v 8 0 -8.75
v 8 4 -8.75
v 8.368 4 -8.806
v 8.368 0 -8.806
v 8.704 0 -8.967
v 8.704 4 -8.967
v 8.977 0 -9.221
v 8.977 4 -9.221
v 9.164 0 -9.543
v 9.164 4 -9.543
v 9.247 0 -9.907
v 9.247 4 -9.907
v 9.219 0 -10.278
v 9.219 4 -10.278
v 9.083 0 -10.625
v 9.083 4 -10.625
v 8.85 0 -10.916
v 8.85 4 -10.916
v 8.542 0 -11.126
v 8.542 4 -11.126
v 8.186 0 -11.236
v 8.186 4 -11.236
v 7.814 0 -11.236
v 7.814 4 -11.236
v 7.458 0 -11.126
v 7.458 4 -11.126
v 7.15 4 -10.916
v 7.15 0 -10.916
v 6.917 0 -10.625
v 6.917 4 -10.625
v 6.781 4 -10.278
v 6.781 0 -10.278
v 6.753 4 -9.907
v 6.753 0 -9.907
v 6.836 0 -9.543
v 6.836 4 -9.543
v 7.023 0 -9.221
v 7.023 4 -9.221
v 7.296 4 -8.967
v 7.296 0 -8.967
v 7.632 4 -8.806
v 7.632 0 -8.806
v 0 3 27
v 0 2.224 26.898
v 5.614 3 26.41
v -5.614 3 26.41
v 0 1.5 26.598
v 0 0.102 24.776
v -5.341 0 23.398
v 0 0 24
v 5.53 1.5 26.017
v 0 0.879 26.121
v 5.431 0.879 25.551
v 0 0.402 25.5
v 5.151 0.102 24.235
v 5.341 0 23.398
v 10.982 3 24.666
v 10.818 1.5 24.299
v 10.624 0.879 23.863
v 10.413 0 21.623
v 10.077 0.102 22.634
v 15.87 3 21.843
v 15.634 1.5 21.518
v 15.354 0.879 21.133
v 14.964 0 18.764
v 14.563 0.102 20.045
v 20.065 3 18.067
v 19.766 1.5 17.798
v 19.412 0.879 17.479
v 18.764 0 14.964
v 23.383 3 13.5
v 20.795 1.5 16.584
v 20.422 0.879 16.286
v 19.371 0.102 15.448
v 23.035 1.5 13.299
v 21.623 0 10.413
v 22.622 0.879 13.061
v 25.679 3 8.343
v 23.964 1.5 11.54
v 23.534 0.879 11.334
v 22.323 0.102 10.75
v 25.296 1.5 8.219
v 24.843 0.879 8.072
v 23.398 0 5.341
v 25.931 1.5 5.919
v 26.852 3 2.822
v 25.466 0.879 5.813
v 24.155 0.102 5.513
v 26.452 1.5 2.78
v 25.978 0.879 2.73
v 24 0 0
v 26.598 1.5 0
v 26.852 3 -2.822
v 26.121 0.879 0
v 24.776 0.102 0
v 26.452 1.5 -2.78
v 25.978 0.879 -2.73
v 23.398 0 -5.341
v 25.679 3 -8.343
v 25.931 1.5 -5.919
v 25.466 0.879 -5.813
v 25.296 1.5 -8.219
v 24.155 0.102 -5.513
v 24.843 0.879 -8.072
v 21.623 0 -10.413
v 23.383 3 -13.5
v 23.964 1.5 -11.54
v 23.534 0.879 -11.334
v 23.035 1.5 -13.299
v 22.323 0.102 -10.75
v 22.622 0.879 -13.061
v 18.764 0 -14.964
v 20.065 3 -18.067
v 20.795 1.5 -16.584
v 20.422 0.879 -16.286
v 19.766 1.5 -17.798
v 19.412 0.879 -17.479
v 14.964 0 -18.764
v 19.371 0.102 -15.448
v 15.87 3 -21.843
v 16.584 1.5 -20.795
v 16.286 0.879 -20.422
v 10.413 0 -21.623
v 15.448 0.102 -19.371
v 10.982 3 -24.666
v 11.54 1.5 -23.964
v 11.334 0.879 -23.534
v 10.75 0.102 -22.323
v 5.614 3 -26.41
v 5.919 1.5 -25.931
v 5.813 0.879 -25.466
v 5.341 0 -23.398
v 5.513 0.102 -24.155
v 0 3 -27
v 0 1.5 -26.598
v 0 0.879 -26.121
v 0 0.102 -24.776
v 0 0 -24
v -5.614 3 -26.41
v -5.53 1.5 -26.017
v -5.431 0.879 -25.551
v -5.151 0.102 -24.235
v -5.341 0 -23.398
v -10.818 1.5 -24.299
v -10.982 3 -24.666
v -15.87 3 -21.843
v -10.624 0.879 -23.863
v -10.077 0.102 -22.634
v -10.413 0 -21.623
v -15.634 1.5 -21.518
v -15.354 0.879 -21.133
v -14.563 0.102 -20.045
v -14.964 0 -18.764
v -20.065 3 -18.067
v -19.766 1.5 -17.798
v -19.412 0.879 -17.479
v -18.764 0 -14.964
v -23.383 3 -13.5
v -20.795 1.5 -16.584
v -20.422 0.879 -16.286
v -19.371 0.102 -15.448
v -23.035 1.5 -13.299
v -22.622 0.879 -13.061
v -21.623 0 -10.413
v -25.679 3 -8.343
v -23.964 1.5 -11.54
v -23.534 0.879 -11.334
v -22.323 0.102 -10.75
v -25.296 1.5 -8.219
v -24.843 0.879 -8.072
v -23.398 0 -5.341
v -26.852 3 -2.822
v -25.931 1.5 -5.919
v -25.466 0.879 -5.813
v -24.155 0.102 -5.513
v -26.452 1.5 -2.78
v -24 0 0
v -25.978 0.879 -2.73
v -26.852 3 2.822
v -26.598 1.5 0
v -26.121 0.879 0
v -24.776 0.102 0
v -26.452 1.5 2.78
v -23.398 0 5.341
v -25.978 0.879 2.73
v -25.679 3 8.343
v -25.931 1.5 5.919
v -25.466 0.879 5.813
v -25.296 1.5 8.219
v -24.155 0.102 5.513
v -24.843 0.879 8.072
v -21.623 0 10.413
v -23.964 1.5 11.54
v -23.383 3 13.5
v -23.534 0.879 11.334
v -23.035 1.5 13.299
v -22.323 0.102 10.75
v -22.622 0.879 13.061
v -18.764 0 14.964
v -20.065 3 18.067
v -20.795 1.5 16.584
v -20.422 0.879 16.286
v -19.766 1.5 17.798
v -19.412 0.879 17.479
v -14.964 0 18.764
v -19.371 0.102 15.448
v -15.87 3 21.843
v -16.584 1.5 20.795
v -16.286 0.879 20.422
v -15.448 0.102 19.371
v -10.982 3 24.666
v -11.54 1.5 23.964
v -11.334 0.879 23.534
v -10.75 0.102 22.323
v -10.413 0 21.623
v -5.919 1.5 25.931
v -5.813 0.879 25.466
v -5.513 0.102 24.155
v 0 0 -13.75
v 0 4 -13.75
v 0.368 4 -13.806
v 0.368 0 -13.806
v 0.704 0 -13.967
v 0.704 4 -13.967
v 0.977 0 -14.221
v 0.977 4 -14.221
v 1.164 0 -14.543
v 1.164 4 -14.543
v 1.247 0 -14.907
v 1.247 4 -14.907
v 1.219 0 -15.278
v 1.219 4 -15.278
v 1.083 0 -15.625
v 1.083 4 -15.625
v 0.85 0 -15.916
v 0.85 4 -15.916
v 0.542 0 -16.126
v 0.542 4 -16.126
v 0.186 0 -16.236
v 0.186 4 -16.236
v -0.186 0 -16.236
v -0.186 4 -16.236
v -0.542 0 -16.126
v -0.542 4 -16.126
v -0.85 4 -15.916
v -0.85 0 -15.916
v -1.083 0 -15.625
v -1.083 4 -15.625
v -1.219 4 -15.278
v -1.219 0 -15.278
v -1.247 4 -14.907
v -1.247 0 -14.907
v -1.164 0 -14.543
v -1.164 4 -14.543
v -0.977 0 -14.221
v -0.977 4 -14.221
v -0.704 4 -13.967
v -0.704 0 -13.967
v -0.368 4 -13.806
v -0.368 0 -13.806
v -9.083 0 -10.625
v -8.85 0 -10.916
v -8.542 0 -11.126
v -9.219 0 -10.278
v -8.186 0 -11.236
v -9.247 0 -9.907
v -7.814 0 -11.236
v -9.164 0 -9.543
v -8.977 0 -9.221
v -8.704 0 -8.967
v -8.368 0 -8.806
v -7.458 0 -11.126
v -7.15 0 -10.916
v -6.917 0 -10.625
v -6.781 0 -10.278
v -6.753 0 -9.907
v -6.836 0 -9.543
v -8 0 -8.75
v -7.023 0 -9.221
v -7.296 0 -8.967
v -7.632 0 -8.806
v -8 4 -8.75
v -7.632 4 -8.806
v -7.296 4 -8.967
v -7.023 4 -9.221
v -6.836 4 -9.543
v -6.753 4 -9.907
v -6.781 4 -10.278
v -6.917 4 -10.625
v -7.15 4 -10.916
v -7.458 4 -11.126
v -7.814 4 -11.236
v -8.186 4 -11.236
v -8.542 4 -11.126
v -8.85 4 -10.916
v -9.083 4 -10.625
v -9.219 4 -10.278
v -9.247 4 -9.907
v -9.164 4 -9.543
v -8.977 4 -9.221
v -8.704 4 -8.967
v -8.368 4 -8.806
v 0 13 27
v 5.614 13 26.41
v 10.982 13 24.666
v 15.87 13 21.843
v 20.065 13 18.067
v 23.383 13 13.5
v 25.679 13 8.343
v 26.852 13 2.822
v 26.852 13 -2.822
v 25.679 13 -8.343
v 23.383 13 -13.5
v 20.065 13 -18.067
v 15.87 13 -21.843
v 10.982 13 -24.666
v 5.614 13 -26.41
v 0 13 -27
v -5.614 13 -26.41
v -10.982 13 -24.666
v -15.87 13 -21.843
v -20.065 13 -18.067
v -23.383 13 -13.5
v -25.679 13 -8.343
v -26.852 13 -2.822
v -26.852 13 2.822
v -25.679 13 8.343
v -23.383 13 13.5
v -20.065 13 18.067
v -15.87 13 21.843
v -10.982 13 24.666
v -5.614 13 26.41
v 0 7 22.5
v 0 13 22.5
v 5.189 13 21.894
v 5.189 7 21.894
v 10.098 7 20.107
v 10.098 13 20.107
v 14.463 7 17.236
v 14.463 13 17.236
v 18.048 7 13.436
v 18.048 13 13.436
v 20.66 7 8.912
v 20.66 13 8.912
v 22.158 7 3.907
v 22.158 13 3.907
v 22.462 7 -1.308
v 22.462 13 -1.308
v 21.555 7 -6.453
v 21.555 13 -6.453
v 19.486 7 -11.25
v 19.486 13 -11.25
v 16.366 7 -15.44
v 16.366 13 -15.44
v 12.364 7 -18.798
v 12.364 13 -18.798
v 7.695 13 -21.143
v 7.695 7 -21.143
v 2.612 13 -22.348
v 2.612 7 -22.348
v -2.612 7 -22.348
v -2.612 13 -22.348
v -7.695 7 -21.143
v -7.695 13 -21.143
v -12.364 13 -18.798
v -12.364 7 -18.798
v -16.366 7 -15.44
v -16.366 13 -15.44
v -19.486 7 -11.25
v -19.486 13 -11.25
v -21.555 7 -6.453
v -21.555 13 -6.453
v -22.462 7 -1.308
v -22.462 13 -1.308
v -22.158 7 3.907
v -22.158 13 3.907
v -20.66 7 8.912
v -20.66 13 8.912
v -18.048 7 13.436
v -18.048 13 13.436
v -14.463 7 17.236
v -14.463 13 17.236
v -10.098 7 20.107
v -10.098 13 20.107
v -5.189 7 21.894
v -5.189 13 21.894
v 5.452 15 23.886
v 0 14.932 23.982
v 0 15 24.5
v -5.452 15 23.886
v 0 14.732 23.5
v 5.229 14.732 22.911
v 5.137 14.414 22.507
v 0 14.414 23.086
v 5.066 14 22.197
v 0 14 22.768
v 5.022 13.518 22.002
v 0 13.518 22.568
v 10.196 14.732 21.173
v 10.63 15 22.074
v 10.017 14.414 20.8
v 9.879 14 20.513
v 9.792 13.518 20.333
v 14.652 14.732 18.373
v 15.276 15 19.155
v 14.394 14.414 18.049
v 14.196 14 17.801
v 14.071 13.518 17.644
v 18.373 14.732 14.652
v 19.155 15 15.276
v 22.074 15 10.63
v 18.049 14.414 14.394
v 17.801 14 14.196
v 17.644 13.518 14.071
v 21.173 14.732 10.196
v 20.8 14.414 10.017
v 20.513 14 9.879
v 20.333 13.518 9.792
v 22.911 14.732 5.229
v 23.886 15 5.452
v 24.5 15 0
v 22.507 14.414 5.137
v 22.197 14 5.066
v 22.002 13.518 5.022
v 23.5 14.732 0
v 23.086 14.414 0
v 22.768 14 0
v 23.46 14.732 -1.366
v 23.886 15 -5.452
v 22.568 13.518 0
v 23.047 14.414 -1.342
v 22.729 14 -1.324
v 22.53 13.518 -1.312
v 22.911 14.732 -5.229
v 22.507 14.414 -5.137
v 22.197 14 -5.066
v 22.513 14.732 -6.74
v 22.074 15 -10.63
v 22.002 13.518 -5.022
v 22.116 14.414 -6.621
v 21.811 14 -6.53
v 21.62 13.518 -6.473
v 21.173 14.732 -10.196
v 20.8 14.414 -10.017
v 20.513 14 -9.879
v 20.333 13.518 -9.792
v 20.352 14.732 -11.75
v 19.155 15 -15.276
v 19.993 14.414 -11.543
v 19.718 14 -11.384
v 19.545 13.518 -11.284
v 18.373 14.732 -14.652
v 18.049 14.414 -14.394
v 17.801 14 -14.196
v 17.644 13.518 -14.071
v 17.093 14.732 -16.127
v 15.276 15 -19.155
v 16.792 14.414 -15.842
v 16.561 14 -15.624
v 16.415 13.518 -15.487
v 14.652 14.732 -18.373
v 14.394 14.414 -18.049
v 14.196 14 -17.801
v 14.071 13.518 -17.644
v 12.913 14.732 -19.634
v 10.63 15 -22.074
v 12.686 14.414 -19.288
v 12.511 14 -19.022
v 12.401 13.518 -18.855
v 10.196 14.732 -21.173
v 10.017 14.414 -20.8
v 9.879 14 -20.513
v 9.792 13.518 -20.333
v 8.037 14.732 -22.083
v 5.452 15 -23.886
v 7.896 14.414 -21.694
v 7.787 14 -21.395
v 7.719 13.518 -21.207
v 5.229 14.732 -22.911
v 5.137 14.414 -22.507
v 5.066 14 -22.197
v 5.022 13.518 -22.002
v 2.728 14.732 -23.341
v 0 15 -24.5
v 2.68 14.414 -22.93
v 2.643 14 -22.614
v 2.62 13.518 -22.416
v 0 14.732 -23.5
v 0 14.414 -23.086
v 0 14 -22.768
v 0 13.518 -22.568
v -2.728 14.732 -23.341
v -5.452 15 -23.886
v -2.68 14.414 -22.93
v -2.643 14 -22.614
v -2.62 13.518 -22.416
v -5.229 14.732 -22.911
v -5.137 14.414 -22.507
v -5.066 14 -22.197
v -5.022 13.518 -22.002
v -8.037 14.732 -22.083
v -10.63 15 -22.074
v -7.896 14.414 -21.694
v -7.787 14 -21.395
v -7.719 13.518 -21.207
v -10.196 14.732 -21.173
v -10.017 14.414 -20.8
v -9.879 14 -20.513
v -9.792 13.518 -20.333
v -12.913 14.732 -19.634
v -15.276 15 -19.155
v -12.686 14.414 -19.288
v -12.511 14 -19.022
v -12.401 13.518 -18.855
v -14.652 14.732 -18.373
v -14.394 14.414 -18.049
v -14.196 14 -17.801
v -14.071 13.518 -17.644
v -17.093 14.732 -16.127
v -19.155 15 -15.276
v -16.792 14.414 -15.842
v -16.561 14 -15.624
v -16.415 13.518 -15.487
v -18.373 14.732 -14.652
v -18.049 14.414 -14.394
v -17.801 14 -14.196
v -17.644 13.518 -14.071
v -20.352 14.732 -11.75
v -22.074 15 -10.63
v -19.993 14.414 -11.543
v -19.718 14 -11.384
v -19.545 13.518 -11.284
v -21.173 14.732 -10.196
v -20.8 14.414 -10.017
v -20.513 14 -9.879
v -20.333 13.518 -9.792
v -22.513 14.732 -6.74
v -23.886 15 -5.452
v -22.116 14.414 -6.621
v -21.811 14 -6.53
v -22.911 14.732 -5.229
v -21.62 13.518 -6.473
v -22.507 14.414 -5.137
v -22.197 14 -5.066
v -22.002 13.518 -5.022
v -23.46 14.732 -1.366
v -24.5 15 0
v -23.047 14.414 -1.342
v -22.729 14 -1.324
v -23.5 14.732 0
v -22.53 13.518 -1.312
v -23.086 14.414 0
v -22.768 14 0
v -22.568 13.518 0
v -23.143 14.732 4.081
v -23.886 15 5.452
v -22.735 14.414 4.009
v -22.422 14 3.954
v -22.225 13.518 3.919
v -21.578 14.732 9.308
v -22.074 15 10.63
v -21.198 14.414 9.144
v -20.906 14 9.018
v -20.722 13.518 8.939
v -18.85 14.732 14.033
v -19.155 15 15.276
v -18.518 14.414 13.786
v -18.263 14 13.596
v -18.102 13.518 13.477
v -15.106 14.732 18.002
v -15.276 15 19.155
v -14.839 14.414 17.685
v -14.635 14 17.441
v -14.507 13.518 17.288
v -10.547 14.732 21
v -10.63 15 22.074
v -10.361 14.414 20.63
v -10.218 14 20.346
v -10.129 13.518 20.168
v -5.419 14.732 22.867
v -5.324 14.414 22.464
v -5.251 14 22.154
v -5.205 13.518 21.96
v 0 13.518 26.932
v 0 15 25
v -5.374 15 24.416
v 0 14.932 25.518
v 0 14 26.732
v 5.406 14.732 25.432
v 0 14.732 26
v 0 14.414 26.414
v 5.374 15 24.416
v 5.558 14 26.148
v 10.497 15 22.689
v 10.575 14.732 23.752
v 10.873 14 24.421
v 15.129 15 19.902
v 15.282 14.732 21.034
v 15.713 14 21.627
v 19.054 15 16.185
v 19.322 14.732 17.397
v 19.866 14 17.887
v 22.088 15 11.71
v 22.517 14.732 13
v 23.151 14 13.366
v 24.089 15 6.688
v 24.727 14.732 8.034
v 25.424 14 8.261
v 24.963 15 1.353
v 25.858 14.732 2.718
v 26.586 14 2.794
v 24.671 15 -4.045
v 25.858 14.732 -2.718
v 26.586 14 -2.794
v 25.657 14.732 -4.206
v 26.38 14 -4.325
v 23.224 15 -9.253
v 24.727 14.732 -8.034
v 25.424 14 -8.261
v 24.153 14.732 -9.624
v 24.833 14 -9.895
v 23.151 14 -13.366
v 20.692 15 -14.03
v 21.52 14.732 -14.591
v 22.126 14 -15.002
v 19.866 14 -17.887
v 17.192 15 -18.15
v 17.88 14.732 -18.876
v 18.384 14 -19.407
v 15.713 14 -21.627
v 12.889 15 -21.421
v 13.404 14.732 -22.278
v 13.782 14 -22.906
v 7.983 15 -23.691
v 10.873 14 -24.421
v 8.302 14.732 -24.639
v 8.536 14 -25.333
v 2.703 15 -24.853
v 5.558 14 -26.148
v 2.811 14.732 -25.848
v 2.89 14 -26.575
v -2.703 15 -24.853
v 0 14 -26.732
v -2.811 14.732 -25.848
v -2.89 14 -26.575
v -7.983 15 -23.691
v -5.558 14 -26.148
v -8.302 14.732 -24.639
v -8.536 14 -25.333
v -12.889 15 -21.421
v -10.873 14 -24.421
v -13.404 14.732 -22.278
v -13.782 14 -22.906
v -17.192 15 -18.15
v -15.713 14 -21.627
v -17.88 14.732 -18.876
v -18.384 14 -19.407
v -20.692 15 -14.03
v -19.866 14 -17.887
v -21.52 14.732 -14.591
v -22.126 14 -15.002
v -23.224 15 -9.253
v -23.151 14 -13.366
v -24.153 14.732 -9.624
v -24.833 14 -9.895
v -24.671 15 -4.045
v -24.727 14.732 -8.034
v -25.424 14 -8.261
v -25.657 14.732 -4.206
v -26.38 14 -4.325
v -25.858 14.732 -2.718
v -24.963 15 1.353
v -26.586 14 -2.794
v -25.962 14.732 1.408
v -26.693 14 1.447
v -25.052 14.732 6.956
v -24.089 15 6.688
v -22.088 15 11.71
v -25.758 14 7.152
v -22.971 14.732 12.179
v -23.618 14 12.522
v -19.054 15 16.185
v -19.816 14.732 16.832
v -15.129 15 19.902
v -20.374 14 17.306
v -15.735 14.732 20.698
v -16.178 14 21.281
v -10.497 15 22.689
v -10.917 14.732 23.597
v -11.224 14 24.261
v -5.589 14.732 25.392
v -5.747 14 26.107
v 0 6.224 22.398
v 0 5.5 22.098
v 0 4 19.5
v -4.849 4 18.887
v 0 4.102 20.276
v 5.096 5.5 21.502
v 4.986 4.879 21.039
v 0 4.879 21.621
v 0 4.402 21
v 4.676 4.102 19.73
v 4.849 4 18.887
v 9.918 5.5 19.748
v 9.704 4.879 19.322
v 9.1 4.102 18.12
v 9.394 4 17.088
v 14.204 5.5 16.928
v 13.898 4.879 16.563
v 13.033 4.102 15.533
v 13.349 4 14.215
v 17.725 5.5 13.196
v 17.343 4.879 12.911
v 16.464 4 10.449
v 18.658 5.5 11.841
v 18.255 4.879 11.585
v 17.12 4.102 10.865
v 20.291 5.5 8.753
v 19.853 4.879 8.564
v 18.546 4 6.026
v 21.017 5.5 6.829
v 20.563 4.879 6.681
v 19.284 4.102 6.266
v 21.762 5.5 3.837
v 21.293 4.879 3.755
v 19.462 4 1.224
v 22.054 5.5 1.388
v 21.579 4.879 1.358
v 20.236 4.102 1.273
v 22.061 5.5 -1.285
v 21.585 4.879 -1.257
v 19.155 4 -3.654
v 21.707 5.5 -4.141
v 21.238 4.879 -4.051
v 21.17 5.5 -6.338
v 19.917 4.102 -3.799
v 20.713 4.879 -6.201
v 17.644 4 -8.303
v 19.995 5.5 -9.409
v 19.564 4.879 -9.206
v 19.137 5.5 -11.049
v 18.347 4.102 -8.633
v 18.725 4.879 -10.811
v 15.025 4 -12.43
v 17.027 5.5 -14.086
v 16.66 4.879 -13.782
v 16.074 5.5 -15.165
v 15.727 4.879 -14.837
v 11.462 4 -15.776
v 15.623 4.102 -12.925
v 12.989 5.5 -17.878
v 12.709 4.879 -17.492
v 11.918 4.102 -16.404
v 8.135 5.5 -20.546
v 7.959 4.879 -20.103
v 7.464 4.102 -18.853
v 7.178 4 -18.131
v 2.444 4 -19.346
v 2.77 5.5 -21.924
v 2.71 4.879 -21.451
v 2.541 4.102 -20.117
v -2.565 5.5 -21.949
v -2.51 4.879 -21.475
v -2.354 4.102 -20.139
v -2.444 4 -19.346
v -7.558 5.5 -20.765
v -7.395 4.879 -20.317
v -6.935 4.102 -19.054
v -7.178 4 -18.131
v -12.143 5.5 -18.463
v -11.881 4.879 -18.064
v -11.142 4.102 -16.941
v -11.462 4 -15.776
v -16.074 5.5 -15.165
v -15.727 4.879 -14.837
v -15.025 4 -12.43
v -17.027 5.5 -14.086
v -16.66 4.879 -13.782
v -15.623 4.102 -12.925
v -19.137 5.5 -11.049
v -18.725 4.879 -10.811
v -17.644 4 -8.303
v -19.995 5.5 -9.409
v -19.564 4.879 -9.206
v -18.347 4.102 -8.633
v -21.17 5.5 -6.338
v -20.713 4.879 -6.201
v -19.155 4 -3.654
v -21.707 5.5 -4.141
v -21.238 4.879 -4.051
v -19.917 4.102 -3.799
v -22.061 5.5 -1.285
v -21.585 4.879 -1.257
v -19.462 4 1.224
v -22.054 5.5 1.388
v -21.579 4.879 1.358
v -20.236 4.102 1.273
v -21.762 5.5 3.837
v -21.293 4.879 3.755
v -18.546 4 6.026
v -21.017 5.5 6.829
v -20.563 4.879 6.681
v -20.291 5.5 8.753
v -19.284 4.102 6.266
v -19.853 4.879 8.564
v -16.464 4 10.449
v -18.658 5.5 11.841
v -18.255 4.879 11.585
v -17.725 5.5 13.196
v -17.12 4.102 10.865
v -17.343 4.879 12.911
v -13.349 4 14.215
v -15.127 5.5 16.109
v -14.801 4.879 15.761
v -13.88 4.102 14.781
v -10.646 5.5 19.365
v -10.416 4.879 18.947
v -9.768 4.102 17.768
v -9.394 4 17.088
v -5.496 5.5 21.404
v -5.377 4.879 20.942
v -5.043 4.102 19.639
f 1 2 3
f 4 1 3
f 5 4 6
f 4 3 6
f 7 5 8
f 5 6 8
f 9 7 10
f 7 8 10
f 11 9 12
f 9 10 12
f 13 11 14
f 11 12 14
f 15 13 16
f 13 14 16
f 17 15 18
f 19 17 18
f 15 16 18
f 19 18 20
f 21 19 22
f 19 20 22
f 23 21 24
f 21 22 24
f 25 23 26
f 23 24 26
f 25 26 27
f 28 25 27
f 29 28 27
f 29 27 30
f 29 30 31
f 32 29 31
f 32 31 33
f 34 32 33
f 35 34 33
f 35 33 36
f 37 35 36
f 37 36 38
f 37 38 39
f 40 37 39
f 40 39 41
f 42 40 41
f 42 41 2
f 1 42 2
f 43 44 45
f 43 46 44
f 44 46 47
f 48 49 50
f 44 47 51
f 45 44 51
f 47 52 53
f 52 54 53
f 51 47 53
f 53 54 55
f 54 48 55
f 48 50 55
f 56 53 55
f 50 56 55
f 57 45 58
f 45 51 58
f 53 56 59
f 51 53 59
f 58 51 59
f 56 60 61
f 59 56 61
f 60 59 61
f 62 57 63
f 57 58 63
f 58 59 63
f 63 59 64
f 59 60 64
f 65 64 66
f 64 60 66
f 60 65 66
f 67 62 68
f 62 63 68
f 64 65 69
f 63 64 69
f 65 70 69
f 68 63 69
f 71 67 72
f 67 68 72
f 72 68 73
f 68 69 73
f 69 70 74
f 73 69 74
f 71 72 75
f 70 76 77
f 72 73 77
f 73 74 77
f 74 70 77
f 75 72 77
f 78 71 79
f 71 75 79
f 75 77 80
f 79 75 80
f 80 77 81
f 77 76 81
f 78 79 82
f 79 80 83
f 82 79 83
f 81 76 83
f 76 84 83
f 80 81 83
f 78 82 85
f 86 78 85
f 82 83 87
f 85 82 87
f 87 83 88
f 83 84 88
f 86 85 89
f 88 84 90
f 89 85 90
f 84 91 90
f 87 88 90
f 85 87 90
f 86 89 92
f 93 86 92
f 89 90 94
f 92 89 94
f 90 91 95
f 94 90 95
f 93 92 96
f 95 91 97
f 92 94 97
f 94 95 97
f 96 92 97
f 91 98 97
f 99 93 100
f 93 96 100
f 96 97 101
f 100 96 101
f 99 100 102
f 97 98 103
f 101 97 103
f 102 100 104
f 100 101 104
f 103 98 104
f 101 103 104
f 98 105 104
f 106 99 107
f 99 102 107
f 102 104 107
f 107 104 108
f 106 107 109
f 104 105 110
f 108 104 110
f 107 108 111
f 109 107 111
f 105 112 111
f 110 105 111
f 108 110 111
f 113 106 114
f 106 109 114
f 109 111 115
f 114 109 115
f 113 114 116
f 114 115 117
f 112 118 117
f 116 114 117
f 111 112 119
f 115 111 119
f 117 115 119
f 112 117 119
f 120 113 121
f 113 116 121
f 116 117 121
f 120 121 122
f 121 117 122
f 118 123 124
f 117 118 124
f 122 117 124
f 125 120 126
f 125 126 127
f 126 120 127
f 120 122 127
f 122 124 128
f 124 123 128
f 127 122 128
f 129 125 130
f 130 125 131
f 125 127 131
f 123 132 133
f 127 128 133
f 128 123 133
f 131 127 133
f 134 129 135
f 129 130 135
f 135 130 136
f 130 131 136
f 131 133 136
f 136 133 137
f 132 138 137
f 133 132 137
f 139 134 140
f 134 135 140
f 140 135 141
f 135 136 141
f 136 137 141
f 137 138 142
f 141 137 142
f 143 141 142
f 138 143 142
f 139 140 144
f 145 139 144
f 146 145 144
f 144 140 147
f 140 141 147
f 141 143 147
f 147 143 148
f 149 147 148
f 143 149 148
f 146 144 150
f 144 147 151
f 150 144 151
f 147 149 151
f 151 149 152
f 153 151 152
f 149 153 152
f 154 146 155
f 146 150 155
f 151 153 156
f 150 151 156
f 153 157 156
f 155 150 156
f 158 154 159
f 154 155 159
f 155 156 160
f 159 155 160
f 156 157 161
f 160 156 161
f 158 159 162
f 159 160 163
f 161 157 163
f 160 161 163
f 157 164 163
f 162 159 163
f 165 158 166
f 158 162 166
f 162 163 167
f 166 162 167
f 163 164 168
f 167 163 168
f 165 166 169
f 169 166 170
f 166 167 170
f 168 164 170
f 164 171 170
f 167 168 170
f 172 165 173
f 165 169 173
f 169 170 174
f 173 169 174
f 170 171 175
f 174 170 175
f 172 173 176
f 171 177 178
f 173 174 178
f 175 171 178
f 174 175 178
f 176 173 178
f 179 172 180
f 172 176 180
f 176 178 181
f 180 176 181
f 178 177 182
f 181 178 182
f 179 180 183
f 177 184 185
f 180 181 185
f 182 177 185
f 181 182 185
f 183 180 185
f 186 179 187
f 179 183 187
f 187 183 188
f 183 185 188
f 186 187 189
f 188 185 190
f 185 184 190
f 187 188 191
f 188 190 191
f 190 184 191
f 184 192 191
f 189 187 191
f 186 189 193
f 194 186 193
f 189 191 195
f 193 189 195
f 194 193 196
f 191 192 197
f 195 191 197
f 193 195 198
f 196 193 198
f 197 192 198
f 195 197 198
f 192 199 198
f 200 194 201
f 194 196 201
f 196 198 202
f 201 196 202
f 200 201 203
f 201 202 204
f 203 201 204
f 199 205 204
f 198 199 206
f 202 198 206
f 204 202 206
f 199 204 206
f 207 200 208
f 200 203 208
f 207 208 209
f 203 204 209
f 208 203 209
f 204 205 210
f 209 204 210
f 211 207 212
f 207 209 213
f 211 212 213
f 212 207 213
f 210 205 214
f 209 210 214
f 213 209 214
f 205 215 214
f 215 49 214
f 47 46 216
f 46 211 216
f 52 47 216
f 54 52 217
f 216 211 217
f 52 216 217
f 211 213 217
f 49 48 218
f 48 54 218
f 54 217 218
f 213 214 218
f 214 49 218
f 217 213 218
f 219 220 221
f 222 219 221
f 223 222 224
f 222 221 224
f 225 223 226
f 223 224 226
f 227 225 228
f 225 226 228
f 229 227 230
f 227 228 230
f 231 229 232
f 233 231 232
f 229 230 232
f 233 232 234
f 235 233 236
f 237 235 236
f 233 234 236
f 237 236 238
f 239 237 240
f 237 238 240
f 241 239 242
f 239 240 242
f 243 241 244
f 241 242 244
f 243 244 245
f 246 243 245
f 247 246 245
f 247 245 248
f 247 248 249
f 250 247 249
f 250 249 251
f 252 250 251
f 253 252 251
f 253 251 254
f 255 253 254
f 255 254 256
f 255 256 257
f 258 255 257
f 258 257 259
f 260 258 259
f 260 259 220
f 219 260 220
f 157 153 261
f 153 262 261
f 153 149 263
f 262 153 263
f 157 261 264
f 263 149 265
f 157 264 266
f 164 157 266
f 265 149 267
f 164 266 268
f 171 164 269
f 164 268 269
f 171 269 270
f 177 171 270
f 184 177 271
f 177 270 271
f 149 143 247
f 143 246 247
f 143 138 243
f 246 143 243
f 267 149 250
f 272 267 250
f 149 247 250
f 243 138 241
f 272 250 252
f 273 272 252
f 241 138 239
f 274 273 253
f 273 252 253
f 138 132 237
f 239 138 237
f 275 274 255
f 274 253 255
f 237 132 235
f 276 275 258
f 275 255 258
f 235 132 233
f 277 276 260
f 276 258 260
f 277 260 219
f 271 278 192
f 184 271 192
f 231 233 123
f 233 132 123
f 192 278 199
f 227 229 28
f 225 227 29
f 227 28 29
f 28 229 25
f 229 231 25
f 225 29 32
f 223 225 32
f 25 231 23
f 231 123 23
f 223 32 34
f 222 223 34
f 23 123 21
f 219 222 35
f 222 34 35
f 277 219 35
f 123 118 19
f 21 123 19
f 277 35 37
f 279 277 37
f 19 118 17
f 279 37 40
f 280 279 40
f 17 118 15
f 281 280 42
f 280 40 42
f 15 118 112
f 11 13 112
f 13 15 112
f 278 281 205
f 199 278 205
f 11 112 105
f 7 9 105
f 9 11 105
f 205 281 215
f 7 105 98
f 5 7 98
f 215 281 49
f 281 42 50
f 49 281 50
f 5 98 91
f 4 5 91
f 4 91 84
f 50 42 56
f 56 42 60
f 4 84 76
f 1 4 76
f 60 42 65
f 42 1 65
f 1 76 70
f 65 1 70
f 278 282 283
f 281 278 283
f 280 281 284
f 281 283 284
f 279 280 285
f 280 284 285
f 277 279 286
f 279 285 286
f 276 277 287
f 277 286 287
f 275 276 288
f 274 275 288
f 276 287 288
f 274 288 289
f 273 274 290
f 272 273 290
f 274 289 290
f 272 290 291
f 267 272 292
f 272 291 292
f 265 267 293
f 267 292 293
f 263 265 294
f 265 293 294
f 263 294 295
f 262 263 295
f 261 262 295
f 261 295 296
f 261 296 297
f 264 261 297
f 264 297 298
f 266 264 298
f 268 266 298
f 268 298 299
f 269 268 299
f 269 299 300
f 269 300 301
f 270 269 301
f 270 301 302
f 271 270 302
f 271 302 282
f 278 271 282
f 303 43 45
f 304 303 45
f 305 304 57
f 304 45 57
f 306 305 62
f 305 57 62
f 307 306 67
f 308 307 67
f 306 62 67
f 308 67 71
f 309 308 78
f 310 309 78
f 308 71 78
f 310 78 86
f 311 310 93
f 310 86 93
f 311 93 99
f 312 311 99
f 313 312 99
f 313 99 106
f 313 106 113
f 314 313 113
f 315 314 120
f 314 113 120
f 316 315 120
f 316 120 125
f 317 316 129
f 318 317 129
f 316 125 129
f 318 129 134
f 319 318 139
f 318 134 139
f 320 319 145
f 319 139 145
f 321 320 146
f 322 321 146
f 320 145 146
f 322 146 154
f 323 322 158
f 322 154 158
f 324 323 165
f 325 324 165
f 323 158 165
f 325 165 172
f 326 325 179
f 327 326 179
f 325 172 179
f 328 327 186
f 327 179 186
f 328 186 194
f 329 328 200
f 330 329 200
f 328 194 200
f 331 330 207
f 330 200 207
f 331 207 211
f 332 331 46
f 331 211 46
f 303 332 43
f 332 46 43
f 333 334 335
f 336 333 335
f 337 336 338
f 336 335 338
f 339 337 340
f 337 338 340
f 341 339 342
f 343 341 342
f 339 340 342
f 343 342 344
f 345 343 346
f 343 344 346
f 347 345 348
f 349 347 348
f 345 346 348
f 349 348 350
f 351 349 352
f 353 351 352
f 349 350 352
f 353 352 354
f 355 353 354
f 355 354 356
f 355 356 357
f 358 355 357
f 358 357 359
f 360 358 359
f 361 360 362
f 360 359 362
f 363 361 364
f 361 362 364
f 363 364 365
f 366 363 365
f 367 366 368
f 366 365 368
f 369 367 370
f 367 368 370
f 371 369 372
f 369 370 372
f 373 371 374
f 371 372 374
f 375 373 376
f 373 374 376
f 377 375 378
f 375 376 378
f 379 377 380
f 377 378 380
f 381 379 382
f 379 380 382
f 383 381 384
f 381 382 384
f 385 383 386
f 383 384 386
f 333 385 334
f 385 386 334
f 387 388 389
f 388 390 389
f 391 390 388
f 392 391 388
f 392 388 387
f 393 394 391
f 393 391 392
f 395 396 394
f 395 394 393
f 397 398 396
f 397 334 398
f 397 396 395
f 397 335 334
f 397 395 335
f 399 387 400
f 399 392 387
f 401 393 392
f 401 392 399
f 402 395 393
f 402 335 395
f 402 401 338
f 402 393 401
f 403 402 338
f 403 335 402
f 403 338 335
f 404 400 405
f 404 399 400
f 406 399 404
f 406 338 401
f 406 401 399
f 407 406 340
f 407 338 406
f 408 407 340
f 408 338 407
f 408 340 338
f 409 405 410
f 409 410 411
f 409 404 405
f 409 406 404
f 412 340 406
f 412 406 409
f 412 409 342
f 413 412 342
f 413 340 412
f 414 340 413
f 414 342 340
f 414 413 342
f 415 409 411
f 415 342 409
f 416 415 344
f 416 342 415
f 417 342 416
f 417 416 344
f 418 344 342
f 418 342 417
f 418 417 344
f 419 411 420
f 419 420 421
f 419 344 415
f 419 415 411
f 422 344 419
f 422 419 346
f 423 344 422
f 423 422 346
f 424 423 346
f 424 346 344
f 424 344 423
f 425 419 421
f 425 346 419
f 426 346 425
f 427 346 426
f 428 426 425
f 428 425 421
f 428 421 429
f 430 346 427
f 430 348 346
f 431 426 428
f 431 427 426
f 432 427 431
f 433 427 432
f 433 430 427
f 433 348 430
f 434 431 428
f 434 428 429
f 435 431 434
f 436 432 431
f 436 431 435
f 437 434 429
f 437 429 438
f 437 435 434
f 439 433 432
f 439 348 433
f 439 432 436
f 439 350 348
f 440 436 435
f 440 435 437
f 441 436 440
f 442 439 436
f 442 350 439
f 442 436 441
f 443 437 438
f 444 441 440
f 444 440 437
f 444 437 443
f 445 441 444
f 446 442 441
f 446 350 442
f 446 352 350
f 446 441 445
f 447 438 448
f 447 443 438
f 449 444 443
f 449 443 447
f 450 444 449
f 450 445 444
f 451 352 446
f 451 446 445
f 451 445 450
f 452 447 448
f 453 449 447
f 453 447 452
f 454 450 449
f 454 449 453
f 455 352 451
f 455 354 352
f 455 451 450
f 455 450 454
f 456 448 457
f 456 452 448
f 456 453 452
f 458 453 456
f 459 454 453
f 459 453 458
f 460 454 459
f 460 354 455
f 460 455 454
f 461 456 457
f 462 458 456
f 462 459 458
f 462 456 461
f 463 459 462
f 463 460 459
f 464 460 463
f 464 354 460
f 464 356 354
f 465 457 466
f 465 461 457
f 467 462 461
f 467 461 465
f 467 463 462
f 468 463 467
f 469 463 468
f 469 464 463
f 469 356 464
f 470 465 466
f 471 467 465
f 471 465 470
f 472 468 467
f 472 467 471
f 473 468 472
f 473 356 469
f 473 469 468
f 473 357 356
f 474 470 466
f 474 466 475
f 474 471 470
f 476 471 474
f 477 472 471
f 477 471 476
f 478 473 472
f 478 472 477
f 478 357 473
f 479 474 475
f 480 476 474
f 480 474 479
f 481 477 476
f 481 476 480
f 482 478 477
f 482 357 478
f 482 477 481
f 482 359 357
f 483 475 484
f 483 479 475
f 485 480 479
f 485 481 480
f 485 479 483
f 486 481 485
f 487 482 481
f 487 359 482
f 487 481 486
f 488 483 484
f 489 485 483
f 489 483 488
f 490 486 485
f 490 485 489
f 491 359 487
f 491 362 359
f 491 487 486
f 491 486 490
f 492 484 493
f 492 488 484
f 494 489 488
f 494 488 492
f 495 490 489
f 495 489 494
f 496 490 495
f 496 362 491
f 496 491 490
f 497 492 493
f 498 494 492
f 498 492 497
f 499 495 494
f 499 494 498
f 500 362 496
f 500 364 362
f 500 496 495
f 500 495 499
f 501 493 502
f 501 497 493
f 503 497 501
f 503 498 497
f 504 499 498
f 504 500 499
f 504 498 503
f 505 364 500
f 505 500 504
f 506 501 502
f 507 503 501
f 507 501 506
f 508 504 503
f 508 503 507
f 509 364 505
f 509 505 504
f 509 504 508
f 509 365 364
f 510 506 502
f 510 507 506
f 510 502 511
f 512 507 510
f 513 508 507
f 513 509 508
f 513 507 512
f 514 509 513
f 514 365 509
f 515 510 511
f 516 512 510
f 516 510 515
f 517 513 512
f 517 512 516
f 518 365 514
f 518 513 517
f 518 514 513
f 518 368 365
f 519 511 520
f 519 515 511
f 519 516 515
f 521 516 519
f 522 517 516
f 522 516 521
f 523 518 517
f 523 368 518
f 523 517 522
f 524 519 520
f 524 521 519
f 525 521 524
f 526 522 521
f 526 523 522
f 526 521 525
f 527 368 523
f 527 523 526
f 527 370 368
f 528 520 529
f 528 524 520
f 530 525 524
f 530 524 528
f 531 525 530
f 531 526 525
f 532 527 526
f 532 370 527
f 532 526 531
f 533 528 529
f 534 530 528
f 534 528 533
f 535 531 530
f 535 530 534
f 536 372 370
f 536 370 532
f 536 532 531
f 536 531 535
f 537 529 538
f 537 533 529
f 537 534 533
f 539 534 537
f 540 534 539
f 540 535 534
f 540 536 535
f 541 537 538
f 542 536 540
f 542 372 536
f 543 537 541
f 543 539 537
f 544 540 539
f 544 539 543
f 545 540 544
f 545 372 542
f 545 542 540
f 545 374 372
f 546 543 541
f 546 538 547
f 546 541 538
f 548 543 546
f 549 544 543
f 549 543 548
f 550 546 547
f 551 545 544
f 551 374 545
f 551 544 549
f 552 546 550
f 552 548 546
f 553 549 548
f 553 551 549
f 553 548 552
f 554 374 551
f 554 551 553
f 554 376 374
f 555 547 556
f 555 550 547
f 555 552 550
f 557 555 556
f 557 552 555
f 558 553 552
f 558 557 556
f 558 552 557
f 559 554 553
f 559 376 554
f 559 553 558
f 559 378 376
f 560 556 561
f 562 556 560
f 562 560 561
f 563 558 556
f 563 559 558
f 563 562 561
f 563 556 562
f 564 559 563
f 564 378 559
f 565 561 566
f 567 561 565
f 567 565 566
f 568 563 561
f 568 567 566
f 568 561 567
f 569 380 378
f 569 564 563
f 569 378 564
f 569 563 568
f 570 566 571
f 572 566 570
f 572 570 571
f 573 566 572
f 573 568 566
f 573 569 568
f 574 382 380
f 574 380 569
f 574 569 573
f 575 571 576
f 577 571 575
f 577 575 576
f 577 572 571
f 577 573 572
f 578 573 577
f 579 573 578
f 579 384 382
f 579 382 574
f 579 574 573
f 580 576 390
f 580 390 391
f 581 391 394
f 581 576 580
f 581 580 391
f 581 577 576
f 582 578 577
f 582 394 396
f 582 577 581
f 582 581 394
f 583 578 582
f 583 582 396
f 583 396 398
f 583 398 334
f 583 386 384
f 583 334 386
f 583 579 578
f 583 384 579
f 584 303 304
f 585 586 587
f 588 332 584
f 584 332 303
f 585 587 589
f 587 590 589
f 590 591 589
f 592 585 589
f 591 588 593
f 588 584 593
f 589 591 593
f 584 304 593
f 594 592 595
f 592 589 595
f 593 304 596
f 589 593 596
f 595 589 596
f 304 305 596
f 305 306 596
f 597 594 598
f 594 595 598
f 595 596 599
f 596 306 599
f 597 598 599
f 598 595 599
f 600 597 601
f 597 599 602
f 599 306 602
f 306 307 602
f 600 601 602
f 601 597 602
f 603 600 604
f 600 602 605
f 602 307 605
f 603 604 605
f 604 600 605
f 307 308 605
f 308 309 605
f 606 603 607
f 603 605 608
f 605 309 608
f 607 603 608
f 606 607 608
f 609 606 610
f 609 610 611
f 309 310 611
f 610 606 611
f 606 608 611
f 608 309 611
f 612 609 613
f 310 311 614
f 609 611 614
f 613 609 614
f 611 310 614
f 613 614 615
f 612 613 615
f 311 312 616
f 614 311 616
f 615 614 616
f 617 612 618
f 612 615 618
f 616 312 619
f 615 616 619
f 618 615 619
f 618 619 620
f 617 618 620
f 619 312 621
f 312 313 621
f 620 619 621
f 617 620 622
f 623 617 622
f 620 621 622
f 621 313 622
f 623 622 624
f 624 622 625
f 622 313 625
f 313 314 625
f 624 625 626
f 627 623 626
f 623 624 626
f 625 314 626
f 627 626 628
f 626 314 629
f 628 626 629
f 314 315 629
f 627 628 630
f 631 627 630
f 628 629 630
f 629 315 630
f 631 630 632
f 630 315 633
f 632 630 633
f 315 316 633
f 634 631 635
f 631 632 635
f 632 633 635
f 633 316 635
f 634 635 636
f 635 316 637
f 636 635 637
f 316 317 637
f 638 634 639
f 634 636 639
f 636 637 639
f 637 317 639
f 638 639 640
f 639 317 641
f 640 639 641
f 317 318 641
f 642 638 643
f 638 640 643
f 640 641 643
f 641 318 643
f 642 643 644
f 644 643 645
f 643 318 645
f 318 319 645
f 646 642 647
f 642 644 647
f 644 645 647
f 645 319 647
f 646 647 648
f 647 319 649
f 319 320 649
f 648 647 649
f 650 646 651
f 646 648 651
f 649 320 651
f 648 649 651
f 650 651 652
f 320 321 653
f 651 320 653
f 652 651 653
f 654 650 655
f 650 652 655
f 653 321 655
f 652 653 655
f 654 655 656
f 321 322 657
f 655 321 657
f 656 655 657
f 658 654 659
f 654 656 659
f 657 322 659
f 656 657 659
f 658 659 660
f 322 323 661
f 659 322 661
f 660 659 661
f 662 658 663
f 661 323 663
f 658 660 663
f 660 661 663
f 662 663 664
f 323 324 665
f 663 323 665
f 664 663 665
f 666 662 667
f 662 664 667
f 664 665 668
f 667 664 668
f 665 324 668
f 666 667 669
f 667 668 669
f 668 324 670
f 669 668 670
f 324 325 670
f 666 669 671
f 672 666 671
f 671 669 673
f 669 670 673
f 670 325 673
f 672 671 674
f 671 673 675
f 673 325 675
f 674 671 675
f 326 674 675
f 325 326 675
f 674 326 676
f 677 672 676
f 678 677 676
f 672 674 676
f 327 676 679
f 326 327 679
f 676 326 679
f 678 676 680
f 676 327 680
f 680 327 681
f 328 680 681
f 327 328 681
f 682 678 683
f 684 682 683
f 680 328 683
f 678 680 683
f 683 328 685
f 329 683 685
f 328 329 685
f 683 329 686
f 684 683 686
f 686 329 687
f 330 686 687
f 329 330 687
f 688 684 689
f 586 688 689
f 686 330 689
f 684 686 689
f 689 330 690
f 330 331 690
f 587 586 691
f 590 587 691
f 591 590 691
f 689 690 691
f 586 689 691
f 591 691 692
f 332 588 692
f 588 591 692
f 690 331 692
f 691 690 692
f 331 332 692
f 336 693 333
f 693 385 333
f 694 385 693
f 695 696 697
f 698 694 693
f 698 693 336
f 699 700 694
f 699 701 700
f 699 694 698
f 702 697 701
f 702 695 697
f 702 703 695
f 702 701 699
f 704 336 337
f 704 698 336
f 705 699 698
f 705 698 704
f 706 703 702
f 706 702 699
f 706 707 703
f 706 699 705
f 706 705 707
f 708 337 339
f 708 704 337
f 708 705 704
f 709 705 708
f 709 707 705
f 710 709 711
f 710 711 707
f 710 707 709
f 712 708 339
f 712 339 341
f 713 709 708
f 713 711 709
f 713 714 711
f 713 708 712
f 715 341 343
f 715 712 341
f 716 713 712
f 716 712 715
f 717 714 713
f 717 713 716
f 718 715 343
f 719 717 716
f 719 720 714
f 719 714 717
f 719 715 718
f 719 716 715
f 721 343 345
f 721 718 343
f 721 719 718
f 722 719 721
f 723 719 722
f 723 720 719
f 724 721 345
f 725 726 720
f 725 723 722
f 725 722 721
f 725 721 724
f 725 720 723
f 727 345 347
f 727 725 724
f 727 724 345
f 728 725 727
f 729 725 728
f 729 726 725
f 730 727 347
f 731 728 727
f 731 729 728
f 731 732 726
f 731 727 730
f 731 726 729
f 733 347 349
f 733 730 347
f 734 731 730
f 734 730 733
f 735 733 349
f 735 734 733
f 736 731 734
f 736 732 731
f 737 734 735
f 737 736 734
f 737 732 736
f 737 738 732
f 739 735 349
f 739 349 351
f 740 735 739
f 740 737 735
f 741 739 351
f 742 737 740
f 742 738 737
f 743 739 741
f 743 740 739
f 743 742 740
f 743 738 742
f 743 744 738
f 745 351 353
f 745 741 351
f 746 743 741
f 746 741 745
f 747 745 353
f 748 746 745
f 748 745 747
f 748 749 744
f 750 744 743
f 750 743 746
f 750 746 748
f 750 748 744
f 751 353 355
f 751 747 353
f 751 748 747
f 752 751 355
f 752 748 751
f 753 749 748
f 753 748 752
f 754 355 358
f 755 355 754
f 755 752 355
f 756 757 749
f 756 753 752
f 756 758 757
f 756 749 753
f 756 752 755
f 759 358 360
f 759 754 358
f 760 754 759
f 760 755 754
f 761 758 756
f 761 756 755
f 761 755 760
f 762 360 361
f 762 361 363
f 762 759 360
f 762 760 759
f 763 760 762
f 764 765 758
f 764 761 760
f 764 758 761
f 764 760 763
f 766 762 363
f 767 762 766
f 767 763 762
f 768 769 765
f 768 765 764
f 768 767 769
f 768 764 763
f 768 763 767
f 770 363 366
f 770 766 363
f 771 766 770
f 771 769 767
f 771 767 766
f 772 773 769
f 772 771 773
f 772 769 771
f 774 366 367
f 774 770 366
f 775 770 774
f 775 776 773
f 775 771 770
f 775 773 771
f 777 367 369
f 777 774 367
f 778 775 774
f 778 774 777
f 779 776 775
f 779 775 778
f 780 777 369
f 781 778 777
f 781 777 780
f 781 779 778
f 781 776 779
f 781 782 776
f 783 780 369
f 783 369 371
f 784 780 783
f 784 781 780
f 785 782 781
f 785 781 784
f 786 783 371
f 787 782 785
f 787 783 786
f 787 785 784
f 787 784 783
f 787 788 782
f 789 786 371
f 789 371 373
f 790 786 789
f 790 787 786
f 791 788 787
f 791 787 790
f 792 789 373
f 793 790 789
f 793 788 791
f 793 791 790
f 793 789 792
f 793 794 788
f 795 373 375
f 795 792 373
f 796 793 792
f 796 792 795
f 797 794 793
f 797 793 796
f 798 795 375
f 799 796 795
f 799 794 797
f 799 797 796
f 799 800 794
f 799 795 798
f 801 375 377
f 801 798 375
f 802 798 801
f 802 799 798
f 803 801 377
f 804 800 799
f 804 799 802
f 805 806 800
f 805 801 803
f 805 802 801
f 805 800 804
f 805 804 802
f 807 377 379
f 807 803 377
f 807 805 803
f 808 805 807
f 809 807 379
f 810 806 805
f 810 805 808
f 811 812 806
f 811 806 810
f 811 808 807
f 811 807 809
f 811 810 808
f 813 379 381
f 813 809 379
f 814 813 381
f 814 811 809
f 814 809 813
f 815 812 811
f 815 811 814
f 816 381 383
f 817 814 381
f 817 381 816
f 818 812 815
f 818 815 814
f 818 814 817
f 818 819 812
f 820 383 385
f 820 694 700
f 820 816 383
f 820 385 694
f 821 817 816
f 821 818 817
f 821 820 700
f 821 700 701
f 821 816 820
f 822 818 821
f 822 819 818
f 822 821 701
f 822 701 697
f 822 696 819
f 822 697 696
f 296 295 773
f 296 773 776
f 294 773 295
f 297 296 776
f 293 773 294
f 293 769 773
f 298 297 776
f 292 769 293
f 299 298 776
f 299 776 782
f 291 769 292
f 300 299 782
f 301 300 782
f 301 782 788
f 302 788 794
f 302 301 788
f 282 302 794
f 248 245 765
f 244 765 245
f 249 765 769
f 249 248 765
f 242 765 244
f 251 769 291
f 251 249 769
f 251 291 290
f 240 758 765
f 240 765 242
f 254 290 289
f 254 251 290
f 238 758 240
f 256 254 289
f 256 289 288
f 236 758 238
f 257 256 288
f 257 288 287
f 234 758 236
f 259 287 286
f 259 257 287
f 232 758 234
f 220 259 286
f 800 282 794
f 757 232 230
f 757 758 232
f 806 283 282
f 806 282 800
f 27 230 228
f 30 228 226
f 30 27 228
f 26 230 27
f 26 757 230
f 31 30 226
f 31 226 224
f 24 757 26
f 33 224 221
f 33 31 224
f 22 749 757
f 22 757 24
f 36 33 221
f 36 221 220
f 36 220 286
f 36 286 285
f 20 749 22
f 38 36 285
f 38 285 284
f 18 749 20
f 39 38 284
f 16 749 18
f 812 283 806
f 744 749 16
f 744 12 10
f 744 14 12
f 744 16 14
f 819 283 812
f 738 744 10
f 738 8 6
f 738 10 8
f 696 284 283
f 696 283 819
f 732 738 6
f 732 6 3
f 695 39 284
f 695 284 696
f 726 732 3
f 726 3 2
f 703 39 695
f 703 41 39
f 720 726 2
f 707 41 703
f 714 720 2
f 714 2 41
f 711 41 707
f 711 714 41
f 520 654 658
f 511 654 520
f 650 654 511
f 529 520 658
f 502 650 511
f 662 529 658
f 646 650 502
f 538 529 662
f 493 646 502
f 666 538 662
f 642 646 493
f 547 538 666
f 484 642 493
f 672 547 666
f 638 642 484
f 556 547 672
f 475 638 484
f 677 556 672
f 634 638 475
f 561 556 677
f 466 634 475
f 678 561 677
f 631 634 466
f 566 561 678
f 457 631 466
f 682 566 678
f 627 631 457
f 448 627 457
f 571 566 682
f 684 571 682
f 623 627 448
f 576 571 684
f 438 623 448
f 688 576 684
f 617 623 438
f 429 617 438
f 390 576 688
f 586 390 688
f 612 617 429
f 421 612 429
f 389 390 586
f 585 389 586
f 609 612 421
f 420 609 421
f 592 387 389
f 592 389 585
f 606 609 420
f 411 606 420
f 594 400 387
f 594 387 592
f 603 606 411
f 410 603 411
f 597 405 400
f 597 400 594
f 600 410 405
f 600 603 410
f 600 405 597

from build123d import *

# Parameters (mm, degrees)
SKETCH1_R           = 27
BOSS_EXTRUDE1_DEPTH = 15
SKETCH2_R           = 22.5
CUT_EXTRUDE1_DEPTH  = 11
FILLET1_R           = 3
FILLET2_R           = 3
FILLET3_R           = 2
FILLET4_R           = 2
SKETCH4_R           = 1.25
CUT_EXTRUDE2_DEPTH  = 11


with BuildPart() as part:
    # Sketch1 → Boss-Extrude1 (new body)
    with BuildSketch(Plane(origin=(0, 0, 0), x_dir=(1, 0, 0), z_dir=(0, 1, 0))):
        with Locations(Location((0, 0, 0), (0, 0, 270))):
            Circle(SKETCH1_R)
    extrude(amount=BOSS_EXTRUDE1_DEPTH)

    # Sketch2 → Cut-Extrude1 (cut)
    with BuildSketch(Plane(origin=(0, 15, 0), x_dir=(1, 0, 0), z_dir=(0, 1, 0))):
        with Locations(Location((0, 0, 0), (0, 0, 270))):
            Circle(SKETCH2_R)
    extrude(amount=-CUT_EXTRUDE1_DEPTH, mode=Mode.SUBTRACT)

    # Fillet1
    fillet1_edges = [part.edges().sort_by_distance(p)[0] for p in [
        (0, 0, -27),
    ]]
    fillet(fillet1_edges, radius=FILLET1_R)

    # Fillet2
    fillet2_edges = [part.edges().sort_by_distance(p)[0] for p in [
        (0, 4, -22.5),
    ]]
    fillet(fillet2_edges, radius=FILLET2_R)

    # Fillet3
    fillet3_edges = [part.edges().sort_by_distance(p)[0] for p in [
        (0, 15, -27),
    ]]
    fillet(fillet3_edges, radius=FILLET3_R)

    # Fillet4
    fillet4_edges = [part.edges().sort_by_distance(p)[0] for p in [
        (0, 15, -22.5),
    ]]
    fillet(fillet4_edges, radius=FILLET4_R)

    # Sketch4 → Cut-Extrude2 (cut)
    with BuildSketch(Plane(origin=(0, 4, 0), x_dir=(1, 0, 0), z_dir=(0, 1, 0))):
        with Locations(Location((-8, 10, 0), (0, 0, 270))):
            Circle(SKETCH4_R)
        with Locations(Location((8, 10, 0), (0, 0, 270))):
            Circle(SKETCH4_R)
        with Locations(Location((0, 15, 0), (0, 0, 270))):
            Circle(SKETCH4_R)
    extrude(amount=-CUT_EXTRUDE2_DEPTH, mode=Mode.SUBTRACT)


solid = part.part
